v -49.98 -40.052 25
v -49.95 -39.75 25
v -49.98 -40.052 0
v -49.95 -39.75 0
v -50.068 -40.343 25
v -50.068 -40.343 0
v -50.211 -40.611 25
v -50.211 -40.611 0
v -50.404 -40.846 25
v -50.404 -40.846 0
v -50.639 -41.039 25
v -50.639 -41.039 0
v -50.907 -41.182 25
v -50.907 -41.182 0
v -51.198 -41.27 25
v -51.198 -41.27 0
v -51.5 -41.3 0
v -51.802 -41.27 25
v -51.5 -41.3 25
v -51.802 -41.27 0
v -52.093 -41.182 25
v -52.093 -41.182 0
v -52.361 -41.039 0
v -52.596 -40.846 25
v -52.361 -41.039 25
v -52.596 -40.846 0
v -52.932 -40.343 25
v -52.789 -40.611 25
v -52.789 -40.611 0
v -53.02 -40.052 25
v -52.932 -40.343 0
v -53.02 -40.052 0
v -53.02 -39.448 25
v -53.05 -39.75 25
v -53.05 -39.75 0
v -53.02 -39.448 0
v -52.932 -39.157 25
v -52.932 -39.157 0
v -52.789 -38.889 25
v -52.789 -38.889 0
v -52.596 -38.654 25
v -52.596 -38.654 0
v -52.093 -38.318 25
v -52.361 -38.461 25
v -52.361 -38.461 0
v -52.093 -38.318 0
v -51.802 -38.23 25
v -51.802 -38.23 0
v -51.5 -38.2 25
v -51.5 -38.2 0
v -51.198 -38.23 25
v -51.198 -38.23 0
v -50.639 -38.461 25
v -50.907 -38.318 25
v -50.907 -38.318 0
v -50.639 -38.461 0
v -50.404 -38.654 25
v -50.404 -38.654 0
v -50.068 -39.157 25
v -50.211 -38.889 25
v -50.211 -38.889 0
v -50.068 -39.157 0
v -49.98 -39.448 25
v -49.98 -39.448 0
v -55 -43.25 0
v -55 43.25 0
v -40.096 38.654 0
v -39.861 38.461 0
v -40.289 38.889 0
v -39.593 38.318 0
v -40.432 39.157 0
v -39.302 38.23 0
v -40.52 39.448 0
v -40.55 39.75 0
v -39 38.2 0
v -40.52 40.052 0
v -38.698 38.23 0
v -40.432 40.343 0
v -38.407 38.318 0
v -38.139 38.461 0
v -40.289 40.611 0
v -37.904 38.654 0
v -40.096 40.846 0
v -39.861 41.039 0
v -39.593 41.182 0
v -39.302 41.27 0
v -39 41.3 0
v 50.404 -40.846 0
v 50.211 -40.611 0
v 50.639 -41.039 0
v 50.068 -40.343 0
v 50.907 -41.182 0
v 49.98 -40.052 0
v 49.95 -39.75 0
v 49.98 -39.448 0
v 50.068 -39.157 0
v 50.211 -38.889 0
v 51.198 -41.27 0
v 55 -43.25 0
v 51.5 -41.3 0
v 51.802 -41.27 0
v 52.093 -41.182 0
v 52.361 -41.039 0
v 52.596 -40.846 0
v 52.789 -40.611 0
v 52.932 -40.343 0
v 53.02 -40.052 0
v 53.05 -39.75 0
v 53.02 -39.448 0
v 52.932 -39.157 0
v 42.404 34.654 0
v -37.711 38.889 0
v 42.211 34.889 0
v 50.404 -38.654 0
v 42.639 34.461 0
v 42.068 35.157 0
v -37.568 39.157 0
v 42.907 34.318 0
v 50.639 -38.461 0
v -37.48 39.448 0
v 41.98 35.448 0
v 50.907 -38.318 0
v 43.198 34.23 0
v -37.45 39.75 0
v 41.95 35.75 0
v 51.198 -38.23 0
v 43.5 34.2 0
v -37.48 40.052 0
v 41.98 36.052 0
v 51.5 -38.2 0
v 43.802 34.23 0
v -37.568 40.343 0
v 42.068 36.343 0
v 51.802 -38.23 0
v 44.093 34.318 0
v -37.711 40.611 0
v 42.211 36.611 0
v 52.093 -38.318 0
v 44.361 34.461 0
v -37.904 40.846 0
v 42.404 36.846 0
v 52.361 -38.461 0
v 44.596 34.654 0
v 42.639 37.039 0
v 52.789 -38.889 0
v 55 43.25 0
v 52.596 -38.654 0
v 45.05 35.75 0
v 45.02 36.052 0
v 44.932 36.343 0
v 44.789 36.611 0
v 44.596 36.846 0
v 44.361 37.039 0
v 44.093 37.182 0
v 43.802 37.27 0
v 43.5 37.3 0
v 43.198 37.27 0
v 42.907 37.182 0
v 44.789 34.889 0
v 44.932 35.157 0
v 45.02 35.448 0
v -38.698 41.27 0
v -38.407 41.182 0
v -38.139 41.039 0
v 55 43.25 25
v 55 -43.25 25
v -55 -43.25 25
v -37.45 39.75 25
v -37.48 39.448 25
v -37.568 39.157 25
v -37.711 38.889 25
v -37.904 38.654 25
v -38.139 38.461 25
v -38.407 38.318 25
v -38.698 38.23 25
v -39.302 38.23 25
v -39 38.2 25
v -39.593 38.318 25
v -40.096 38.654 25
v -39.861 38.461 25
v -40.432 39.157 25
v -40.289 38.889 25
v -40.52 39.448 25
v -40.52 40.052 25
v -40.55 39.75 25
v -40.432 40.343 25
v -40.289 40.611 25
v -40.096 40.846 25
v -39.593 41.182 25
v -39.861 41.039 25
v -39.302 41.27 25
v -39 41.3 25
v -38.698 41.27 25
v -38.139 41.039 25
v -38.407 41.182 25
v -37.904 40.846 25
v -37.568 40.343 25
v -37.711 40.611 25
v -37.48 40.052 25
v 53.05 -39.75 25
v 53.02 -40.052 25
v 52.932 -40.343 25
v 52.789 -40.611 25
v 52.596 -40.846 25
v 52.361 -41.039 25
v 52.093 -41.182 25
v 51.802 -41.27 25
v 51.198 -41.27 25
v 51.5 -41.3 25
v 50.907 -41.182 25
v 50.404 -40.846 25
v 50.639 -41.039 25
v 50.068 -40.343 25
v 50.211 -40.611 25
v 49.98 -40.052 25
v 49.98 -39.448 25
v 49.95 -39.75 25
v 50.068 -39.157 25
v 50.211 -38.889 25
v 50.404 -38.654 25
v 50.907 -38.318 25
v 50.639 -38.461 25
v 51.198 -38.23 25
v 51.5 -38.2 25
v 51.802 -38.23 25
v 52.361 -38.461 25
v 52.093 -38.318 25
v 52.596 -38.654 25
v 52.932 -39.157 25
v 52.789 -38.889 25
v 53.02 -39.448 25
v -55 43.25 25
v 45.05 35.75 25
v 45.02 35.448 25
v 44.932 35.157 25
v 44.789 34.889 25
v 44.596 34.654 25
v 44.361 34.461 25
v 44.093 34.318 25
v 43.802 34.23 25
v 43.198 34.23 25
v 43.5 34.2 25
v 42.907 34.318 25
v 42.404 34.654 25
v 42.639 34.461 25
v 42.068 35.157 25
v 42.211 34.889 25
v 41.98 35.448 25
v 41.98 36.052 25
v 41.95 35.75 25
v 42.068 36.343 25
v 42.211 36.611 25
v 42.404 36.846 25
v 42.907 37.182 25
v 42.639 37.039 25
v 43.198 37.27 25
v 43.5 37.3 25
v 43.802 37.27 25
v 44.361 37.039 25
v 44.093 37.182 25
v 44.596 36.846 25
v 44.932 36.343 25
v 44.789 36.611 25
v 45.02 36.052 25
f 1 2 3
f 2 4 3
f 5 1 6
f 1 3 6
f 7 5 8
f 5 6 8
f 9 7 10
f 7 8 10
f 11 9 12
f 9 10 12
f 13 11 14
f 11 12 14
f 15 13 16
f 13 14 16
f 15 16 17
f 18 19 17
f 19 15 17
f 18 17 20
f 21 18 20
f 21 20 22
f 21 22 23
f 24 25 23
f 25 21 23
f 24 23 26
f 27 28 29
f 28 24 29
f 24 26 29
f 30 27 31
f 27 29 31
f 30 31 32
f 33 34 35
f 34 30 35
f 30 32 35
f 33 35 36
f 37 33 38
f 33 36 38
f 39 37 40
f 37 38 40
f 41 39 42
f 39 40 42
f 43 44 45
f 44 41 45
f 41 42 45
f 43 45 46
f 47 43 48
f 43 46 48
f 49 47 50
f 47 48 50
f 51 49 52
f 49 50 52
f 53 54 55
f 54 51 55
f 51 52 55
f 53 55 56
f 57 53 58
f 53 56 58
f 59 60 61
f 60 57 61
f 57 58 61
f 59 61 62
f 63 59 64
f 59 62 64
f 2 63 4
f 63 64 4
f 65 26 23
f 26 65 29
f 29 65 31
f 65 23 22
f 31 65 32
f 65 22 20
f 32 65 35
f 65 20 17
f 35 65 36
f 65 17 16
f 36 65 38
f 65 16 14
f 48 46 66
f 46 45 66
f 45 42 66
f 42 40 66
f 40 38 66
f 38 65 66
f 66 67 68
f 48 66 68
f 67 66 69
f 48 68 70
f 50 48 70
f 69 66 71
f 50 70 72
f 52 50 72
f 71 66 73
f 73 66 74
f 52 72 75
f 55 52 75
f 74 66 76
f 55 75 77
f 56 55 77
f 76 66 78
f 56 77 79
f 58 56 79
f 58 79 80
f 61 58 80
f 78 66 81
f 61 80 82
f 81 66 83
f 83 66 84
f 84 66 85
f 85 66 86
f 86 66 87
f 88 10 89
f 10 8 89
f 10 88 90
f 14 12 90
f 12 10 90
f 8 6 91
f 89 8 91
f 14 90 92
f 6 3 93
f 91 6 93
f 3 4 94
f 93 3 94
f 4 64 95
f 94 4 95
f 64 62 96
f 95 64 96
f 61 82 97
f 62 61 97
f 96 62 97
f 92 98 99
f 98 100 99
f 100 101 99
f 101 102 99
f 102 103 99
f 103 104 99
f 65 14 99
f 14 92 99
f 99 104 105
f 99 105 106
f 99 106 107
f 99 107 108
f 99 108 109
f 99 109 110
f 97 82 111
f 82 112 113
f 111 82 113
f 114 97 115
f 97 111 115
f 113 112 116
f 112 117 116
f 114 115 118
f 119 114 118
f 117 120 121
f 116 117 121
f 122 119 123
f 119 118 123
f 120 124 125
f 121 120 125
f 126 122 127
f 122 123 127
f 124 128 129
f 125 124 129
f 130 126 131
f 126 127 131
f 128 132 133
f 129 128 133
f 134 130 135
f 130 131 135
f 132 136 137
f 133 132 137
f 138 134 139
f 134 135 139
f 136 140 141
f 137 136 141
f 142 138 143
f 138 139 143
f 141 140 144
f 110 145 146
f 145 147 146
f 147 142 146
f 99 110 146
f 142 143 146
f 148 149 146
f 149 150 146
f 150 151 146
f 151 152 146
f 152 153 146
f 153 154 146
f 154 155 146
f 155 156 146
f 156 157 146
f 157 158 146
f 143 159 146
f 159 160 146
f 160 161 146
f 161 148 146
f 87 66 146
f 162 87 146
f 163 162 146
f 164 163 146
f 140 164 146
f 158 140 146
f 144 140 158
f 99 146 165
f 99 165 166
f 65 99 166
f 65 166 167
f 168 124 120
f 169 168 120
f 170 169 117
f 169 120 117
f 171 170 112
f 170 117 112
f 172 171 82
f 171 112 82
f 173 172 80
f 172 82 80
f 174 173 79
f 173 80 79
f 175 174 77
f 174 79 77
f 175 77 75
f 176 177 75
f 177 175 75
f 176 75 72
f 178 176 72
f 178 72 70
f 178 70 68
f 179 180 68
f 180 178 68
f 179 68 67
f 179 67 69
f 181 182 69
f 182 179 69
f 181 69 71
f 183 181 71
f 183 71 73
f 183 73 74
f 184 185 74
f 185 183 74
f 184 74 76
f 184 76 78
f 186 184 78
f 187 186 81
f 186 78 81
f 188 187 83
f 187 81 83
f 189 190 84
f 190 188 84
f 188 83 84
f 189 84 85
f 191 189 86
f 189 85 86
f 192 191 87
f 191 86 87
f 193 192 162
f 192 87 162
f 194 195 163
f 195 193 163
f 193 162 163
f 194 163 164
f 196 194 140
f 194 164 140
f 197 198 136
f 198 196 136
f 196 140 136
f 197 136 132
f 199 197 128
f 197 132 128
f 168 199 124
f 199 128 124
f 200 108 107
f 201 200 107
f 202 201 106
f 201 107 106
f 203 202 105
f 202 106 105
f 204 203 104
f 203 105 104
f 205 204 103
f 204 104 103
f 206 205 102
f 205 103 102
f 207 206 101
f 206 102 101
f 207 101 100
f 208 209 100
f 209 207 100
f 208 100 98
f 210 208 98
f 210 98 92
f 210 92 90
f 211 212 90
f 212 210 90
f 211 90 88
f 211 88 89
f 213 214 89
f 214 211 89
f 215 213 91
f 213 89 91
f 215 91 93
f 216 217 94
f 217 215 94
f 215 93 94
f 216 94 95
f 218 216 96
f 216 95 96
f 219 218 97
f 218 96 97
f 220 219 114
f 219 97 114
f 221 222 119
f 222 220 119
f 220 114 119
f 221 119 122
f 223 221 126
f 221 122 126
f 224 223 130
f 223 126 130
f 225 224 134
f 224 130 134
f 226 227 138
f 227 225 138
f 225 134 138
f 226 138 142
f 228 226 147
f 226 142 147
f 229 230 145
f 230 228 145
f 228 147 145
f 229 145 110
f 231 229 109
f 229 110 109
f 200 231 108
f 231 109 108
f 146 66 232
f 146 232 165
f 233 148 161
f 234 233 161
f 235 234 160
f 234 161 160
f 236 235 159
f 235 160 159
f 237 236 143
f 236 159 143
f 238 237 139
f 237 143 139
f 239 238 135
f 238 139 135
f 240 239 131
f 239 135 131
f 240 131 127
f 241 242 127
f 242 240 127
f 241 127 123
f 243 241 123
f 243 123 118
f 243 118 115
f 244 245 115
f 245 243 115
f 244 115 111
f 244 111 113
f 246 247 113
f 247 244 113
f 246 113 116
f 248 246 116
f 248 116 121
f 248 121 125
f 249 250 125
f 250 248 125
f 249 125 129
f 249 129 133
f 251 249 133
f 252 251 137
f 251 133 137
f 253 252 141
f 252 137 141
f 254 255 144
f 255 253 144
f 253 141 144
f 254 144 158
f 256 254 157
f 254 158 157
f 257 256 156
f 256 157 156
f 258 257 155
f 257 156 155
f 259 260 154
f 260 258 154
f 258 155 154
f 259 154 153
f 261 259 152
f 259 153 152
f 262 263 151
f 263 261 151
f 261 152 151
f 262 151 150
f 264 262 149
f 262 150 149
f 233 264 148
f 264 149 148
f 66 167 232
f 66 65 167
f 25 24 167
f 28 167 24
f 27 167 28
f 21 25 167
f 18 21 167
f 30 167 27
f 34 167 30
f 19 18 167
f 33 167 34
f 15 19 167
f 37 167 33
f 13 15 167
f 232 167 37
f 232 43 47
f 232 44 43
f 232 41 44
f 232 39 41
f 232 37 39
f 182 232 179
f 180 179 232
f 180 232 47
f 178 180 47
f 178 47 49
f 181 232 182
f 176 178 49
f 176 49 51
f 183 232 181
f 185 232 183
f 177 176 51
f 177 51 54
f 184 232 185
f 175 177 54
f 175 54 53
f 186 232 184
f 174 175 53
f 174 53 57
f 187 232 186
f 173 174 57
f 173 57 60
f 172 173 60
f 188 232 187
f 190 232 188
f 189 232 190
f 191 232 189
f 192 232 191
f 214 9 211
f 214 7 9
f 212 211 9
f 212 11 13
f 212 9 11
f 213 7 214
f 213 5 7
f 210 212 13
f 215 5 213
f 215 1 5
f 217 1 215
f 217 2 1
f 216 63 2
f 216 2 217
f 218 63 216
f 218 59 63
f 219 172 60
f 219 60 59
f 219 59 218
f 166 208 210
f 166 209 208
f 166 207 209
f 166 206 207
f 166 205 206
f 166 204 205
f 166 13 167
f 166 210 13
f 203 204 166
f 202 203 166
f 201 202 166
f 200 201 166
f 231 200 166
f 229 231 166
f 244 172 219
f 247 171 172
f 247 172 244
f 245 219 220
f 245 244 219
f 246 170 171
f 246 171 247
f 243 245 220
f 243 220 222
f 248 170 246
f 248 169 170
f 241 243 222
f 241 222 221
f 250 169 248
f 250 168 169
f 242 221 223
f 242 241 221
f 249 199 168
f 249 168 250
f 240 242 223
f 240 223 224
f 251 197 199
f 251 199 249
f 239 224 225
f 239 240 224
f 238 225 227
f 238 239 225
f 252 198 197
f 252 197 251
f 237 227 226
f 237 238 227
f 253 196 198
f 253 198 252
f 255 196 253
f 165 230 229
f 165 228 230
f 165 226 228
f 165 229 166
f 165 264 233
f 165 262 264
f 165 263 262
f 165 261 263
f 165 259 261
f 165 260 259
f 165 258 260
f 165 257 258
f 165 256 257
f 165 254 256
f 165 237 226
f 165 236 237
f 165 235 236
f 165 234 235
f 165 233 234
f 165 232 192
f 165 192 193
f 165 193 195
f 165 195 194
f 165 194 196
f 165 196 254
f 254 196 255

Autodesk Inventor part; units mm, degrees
ref_plane "YZ Plane" through (0, 0, 0) normal (1, 0, 0) x (0, 1, 0)
ref_plane "XZ Plane" through (0, 0, 0) normal (0, 1, 0) x (-1, 0, 0)
ref_plane "XY Plane" through (0, 0, 0) normal (0, 0, 1) x (1, 0, 0)
sketch "Sketch1" plane through (0, 0, 0) normal (0, 0, 1) x (1, 0, 0)
  line L0 (-55, 43.25) -> (55, 43.25)
  line L1 (55, 43.25) -> (55, -43.25)
  line L2 (55, -43.25) -> (-55, -43.25)
  line L3 (-55, -43.25) -> (-55, 43.25)
  circle A0 centre (-39, 39.75) radius 1.55
  circle A1 centre (-51.5, -39.75) radius 1.55
  circle A2 centre (43.5, 35.75) radius 1.55
  circle A3 centre (51.5, -39.75) radius 1.55
  point P0 (0, 0)
  point P1 (-55, 0)
  point P2 (0, 43.25)
  dimension "d0" = 110
  dimension "d1" = 86.5
  dimension "d2" = 16
  dimension "d3" = 83
  dimension "d4" = 3.5
  dimension "d5" = 3.5
  dimension "d6" = 98.5
  dimension "d7" = 79
  dimension "d8" = 106.5
  dimension "d9" = 3.5
  dimension "d10" = 3.1
  dimension "d11" = 3.1
  dimension "d12" = 3.1
  dimension "d13" = 3.1
extrude "Extrusion1" add sketch "Sketch1" along normal blind 25
properties part number "udoomountingholes"
